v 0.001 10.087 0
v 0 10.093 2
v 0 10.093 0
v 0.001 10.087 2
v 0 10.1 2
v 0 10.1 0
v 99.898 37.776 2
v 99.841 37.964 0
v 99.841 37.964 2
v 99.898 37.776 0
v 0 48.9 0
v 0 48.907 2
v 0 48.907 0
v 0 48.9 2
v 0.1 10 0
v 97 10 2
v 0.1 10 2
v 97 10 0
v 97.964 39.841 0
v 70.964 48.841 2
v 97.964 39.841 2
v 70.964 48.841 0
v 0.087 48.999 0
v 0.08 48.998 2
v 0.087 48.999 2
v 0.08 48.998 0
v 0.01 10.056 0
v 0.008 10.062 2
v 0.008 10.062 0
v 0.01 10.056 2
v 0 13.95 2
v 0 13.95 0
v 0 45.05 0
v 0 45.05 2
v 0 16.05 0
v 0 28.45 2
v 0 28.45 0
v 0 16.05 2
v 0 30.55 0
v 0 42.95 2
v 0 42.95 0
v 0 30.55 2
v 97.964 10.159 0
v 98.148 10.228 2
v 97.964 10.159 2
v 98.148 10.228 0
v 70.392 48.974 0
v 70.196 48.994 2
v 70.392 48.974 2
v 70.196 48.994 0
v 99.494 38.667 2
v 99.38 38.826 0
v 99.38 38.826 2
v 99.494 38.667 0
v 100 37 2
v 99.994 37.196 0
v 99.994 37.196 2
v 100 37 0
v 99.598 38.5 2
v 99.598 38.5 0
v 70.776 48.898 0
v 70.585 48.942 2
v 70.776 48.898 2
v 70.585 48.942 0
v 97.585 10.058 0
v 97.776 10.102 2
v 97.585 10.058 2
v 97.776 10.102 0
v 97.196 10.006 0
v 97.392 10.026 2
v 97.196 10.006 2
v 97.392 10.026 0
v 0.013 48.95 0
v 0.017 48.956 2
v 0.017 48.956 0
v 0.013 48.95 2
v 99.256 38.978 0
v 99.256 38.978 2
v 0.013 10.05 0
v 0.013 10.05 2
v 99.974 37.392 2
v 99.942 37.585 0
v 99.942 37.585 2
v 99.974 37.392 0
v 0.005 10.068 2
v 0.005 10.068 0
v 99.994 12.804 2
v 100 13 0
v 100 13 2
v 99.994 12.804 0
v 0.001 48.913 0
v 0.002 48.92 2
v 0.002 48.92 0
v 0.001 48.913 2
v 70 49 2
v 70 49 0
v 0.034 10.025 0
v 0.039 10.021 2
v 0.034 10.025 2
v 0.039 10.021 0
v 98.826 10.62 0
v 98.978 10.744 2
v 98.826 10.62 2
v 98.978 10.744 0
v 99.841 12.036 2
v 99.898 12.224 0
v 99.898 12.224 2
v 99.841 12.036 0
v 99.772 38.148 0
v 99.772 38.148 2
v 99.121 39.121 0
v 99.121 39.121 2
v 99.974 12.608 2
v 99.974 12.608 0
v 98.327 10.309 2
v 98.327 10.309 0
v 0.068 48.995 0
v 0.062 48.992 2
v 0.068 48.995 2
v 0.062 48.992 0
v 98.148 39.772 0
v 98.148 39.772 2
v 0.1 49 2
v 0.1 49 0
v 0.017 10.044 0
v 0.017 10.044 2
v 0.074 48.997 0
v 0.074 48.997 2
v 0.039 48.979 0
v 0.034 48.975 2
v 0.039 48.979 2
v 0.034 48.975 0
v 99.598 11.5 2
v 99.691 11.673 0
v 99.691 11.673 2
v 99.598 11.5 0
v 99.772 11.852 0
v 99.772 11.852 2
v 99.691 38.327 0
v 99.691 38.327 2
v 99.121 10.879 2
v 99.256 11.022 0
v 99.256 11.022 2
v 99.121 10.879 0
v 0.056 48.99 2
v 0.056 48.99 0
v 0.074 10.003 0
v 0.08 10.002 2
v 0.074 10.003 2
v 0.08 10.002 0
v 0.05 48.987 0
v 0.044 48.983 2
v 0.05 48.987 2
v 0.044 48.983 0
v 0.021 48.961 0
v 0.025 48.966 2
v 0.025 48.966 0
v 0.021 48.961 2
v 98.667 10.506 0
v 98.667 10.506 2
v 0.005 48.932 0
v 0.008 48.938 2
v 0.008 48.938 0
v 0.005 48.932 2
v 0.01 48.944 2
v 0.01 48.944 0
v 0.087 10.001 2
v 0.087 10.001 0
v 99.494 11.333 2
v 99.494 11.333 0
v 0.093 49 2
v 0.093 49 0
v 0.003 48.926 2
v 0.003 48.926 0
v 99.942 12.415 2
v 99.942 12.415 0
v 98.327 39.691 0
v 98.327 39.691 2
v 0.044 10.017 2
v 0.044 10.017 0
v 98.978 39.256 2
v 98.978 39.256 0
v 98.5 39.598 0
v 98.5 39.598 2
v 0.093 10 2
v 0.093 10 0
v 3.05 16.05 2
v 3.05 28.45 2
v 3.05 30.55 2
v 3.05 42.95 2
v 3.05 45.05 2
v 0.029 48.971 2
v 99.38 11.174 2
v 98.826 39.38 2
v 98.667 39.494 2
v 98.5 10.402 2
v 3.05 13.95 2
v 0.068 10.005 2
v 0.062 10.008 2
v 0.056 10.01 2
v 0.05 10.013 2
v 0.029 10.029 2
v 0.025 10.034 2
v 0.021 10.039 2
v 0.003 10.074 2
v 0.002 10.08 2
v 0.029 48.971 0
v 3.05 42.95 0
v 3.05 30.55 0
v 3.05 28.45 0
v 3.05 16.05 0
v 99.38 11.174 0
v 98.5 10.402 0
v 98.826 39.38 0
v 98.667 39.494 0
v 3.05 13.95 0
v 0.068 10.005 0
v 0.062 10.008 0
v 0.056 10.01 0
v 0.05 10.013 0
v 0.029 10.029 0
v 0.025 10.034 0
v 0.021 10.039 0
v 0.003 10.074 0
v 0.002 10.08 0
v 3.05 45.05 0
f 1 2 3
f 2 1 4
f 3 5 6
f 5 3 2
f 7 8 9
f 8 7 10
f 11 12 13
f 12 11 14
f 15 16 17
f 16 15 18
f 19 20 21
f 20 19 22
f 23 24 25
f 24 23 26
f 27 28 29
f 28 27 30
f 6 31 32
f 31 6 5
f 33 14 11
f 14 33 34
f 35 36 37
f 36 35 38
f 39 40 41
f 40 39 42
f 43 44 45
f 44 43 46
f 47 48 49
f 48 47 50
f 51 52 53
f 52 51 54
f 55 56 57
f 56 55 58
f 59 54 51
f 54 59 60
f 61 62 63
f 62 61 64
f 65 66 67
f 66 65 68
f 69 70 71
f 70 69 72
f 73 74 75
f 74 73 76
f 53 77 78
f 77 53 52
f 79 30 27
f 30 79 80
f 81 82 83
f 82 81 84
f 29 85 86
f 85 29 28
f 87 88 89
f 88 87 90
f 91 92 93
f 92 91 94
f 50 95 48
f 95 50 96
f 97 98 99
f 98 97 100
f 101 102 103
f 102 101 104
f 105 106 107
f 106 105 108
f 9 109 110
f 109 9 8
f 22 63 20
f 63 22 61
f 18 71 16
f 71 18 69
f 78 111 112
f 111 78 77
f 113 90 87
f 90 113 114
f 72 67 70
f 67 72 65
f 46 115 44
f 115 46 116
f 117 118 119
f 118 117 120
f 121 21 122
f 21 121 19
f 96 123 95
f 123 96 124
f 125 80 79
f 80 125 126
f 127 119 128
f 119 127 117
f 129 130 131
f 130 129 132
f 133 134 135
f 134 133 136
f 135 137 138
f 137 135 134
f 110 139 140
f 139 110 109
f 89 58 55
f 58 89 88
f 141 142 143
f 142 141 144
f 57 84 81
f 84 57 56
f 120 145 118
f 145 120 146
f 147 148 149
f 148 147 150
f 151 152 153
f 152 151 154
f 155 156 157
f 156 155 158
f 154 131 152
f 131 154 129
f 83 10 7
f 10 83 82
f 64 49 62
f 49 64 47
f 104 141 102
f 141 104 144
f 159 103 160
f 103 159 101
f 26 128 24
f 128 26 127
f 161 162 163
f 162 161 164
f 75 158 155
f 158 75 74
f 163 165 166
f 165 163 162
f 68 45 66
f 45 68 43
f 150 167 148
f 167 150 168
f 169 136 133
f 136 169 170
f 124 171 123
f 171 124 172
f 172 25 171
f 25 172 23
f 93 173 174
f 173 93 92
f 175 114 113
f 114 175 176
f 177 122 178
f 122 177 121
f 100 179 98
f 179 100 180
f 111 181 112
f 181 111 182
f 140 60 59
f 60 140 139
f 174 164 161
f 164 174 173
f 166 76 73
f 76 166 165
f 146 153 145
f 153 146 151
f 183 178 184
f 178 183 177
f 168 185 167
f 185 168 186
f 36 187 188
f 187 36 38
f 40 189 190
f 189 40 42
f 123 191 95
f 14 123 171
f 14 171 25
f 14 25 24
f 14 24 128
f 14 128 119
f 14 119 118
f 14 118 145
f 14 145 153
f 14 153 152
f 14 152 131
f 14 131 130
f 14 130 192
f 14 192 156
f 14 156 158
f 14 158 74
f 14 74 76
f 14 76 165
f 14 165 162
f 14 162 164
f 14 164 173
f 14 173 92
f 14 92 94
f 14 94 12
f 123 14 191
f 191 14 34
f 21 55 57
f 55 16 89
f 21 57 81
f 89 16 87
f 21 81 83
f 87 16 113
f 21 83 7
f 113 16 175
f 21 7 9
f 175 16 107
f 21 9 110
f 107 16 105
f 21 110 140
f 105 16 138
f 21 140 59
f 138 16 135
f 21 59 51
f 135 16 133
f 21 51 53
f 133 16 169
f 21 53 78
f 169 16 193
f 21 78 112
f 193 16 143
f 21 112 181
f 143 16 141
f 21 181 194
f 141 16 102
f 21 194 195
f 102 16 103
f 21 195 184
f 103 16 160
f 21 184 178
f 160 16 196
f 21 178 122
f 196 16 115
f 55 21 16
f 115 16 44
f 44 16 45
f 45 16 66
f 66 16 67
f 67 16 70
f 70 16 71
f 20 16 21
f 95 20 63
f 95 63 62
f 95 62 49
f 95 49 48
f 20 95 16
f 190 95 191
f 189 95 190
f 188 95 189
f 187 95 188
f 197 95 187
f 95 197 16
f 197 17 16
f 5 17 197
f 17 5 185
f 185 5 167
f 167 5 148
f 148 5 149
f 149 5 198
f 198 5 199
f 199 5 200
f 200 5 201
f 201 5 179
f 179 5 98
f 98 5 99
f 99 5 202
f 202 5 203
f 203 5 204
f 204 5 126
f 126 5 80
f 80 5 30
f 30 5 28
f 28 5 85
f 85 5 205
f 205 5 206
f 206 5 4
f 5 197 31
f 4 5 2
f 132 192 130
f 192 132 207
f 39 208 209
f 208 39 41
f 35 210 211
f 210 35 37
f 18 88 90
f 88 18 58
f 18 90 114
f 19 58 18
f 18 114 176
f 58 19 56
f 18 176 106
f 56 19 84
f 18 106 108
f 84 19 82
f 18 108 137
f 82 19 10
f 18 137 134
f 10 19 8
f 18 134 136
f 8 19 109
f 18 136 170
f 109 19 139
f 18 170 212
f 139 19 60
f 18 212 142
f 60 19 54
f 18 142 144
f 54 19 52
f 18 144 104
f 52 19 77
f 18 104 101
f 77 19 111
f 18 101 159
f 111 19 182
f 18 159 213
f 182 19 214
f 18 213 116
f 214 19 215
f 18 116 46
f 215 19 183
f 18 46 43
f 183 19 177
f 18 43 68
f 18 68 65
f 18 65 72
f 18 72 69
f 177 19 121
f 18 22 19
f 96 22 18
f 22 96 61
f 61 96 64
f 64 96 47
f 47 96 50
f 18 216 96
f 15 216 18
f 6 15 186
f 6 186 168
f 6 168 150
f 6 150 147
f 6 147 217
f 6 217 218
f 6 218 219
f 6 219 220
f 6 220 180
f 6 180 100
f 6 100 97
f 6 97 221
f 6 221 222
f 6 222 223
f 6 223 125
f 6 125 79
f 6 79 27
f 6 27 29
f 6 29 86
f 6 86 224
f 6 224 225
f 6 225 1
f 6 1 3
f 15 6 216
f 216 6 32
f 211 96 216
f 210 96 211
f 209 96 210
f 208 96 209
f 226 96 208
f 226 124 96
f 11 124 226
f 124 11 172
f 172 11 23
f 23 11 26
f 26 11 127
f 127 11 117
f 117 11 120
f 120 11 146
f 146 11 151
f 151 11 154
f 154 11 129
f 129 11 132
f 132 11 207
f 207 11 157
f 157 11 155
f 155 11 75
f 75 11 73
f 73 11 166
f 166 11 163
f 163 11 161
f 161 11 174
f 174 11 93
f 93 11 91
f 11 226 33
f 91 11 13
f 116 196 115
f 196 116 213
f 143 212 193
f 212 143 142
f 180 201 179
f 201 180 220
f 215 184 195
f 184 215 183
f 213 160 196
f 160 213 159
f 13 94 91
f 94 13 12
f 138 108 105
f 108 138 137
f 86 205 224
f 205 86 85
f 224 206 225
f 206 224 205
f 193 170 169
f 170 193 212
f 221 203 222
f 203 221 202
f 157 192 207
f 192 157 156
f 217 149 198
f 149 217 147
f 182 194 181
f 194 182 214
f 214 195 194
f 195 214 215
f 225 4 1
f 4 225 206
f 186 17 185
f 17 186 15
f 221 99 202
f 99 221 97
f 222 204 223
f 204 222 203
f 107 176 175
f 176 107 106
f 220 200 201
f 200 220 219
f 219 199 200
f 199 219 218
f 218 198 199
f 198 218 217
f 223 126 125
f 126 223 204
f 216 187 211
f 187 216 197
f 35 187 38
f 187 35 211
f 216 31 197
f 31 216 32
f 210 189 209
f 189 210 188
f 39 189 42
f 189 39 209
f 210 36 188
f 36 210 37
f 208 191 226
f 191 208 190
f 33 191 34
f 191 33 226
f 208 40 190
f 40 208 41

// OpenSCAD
// file: wings-common.scad
// Simple glider.

// Copyright (C) 2015 Embecosm Limited (www.embecosm.com)

// Contributor: Jeremy Bennett <jeremy.bennett@embecosm.com>

// This file is licensed under the Creative Commons Attribution-ShareAlike 3.0
// Unported License. To view a copy of this license, visit
// http://creativecommons.org/licenses/by-sa/3.0/ or send a letter to Creative
// Commons, PO Box 1866, Mountain View, CA 94042, USA.


// A very simple hand thrown glider for indoor use.

// This is the common parts of the wings.  Print with very low fill density in
// something like HIPS for low weight.


// Useful constants
corner_r =   3;
micro_r  =   0.1;
wing_z   =   2;
max_x    = 100;
min_x    =  70;
max_y    =  39;
min_y    =  30;

// Constants for the pegs. Note that the length is sum of peg *and* hole
// length.
gap = 0.1;
peg_len = 3 * 2;

// Smooth corners
$fn      = 96;

// 2D outline, which we'll later extrude.
module wing_2d () {
    hull () {
        translate (v = [micro_r, micro_r, 0])
            circle (r = micro_r);
        translate (v = [max_x - corner_r, corner_r, 0])
            circle (r = corner_r);
        translate (v = [max_x - corner_r, min_y - corner_r, 0])
            circle (r = corner_r);
        translate (v = [min_x, max_y - corner_r, 0])
            circle (r = corner_r);
        translate (v = [micro_r, max_y - micro_r, 0])
            circle (r = micro_r);
    }
}
// main file
// Simple glider.

// Copyright (C) 2015 Embecosm Limited (www.embecosm.com)

// Contributor: Jeremy Bennett <jeremy.bennett@embecosm.com>

// This file is licensed under the Creative Commons Attribution-ShareAlike 3.0
// Unported License. To view a copy of this license, visit
// http://creativecommons.org/licenses/by-sa/3.0/ or send a letter to Creative
// Commons, PO Box 1866, Mountain View, CA 94042, USA.


// A very simple hand thrown glider for indoor use.

// This is the left wing.  Print with very low fill density in something like
// HIPS for low weight.

include <wings-common.scad>

// 3D wing
module wing_right_3d () {
    translate (v = [0, 10, 0])
        linear_extrude (height = wing_z, slices = 1, convexity = 1)
            wing_2d ();
}


// Pegs and sockets to join together
module wing_right () {
    difference () {
        wing_right_3d ();
        translate (v = [0, 10 + 5, wing_z / 2])
            cube (size = [peg_len + gap, wing_z + gap, 50], center = true);
        translate (v = [0, 10 + max_y / 2, wing_z / 2])
            cube (size = [peg_len + gap, wing_z + gap, 50], center = true);
        translate (v = [0, 10 + max_y - 5, wing_z / 2])
            cube (size = [peg_len + gap, wing_z + gap, 50], center = true);
    }
}

wing_right ();
